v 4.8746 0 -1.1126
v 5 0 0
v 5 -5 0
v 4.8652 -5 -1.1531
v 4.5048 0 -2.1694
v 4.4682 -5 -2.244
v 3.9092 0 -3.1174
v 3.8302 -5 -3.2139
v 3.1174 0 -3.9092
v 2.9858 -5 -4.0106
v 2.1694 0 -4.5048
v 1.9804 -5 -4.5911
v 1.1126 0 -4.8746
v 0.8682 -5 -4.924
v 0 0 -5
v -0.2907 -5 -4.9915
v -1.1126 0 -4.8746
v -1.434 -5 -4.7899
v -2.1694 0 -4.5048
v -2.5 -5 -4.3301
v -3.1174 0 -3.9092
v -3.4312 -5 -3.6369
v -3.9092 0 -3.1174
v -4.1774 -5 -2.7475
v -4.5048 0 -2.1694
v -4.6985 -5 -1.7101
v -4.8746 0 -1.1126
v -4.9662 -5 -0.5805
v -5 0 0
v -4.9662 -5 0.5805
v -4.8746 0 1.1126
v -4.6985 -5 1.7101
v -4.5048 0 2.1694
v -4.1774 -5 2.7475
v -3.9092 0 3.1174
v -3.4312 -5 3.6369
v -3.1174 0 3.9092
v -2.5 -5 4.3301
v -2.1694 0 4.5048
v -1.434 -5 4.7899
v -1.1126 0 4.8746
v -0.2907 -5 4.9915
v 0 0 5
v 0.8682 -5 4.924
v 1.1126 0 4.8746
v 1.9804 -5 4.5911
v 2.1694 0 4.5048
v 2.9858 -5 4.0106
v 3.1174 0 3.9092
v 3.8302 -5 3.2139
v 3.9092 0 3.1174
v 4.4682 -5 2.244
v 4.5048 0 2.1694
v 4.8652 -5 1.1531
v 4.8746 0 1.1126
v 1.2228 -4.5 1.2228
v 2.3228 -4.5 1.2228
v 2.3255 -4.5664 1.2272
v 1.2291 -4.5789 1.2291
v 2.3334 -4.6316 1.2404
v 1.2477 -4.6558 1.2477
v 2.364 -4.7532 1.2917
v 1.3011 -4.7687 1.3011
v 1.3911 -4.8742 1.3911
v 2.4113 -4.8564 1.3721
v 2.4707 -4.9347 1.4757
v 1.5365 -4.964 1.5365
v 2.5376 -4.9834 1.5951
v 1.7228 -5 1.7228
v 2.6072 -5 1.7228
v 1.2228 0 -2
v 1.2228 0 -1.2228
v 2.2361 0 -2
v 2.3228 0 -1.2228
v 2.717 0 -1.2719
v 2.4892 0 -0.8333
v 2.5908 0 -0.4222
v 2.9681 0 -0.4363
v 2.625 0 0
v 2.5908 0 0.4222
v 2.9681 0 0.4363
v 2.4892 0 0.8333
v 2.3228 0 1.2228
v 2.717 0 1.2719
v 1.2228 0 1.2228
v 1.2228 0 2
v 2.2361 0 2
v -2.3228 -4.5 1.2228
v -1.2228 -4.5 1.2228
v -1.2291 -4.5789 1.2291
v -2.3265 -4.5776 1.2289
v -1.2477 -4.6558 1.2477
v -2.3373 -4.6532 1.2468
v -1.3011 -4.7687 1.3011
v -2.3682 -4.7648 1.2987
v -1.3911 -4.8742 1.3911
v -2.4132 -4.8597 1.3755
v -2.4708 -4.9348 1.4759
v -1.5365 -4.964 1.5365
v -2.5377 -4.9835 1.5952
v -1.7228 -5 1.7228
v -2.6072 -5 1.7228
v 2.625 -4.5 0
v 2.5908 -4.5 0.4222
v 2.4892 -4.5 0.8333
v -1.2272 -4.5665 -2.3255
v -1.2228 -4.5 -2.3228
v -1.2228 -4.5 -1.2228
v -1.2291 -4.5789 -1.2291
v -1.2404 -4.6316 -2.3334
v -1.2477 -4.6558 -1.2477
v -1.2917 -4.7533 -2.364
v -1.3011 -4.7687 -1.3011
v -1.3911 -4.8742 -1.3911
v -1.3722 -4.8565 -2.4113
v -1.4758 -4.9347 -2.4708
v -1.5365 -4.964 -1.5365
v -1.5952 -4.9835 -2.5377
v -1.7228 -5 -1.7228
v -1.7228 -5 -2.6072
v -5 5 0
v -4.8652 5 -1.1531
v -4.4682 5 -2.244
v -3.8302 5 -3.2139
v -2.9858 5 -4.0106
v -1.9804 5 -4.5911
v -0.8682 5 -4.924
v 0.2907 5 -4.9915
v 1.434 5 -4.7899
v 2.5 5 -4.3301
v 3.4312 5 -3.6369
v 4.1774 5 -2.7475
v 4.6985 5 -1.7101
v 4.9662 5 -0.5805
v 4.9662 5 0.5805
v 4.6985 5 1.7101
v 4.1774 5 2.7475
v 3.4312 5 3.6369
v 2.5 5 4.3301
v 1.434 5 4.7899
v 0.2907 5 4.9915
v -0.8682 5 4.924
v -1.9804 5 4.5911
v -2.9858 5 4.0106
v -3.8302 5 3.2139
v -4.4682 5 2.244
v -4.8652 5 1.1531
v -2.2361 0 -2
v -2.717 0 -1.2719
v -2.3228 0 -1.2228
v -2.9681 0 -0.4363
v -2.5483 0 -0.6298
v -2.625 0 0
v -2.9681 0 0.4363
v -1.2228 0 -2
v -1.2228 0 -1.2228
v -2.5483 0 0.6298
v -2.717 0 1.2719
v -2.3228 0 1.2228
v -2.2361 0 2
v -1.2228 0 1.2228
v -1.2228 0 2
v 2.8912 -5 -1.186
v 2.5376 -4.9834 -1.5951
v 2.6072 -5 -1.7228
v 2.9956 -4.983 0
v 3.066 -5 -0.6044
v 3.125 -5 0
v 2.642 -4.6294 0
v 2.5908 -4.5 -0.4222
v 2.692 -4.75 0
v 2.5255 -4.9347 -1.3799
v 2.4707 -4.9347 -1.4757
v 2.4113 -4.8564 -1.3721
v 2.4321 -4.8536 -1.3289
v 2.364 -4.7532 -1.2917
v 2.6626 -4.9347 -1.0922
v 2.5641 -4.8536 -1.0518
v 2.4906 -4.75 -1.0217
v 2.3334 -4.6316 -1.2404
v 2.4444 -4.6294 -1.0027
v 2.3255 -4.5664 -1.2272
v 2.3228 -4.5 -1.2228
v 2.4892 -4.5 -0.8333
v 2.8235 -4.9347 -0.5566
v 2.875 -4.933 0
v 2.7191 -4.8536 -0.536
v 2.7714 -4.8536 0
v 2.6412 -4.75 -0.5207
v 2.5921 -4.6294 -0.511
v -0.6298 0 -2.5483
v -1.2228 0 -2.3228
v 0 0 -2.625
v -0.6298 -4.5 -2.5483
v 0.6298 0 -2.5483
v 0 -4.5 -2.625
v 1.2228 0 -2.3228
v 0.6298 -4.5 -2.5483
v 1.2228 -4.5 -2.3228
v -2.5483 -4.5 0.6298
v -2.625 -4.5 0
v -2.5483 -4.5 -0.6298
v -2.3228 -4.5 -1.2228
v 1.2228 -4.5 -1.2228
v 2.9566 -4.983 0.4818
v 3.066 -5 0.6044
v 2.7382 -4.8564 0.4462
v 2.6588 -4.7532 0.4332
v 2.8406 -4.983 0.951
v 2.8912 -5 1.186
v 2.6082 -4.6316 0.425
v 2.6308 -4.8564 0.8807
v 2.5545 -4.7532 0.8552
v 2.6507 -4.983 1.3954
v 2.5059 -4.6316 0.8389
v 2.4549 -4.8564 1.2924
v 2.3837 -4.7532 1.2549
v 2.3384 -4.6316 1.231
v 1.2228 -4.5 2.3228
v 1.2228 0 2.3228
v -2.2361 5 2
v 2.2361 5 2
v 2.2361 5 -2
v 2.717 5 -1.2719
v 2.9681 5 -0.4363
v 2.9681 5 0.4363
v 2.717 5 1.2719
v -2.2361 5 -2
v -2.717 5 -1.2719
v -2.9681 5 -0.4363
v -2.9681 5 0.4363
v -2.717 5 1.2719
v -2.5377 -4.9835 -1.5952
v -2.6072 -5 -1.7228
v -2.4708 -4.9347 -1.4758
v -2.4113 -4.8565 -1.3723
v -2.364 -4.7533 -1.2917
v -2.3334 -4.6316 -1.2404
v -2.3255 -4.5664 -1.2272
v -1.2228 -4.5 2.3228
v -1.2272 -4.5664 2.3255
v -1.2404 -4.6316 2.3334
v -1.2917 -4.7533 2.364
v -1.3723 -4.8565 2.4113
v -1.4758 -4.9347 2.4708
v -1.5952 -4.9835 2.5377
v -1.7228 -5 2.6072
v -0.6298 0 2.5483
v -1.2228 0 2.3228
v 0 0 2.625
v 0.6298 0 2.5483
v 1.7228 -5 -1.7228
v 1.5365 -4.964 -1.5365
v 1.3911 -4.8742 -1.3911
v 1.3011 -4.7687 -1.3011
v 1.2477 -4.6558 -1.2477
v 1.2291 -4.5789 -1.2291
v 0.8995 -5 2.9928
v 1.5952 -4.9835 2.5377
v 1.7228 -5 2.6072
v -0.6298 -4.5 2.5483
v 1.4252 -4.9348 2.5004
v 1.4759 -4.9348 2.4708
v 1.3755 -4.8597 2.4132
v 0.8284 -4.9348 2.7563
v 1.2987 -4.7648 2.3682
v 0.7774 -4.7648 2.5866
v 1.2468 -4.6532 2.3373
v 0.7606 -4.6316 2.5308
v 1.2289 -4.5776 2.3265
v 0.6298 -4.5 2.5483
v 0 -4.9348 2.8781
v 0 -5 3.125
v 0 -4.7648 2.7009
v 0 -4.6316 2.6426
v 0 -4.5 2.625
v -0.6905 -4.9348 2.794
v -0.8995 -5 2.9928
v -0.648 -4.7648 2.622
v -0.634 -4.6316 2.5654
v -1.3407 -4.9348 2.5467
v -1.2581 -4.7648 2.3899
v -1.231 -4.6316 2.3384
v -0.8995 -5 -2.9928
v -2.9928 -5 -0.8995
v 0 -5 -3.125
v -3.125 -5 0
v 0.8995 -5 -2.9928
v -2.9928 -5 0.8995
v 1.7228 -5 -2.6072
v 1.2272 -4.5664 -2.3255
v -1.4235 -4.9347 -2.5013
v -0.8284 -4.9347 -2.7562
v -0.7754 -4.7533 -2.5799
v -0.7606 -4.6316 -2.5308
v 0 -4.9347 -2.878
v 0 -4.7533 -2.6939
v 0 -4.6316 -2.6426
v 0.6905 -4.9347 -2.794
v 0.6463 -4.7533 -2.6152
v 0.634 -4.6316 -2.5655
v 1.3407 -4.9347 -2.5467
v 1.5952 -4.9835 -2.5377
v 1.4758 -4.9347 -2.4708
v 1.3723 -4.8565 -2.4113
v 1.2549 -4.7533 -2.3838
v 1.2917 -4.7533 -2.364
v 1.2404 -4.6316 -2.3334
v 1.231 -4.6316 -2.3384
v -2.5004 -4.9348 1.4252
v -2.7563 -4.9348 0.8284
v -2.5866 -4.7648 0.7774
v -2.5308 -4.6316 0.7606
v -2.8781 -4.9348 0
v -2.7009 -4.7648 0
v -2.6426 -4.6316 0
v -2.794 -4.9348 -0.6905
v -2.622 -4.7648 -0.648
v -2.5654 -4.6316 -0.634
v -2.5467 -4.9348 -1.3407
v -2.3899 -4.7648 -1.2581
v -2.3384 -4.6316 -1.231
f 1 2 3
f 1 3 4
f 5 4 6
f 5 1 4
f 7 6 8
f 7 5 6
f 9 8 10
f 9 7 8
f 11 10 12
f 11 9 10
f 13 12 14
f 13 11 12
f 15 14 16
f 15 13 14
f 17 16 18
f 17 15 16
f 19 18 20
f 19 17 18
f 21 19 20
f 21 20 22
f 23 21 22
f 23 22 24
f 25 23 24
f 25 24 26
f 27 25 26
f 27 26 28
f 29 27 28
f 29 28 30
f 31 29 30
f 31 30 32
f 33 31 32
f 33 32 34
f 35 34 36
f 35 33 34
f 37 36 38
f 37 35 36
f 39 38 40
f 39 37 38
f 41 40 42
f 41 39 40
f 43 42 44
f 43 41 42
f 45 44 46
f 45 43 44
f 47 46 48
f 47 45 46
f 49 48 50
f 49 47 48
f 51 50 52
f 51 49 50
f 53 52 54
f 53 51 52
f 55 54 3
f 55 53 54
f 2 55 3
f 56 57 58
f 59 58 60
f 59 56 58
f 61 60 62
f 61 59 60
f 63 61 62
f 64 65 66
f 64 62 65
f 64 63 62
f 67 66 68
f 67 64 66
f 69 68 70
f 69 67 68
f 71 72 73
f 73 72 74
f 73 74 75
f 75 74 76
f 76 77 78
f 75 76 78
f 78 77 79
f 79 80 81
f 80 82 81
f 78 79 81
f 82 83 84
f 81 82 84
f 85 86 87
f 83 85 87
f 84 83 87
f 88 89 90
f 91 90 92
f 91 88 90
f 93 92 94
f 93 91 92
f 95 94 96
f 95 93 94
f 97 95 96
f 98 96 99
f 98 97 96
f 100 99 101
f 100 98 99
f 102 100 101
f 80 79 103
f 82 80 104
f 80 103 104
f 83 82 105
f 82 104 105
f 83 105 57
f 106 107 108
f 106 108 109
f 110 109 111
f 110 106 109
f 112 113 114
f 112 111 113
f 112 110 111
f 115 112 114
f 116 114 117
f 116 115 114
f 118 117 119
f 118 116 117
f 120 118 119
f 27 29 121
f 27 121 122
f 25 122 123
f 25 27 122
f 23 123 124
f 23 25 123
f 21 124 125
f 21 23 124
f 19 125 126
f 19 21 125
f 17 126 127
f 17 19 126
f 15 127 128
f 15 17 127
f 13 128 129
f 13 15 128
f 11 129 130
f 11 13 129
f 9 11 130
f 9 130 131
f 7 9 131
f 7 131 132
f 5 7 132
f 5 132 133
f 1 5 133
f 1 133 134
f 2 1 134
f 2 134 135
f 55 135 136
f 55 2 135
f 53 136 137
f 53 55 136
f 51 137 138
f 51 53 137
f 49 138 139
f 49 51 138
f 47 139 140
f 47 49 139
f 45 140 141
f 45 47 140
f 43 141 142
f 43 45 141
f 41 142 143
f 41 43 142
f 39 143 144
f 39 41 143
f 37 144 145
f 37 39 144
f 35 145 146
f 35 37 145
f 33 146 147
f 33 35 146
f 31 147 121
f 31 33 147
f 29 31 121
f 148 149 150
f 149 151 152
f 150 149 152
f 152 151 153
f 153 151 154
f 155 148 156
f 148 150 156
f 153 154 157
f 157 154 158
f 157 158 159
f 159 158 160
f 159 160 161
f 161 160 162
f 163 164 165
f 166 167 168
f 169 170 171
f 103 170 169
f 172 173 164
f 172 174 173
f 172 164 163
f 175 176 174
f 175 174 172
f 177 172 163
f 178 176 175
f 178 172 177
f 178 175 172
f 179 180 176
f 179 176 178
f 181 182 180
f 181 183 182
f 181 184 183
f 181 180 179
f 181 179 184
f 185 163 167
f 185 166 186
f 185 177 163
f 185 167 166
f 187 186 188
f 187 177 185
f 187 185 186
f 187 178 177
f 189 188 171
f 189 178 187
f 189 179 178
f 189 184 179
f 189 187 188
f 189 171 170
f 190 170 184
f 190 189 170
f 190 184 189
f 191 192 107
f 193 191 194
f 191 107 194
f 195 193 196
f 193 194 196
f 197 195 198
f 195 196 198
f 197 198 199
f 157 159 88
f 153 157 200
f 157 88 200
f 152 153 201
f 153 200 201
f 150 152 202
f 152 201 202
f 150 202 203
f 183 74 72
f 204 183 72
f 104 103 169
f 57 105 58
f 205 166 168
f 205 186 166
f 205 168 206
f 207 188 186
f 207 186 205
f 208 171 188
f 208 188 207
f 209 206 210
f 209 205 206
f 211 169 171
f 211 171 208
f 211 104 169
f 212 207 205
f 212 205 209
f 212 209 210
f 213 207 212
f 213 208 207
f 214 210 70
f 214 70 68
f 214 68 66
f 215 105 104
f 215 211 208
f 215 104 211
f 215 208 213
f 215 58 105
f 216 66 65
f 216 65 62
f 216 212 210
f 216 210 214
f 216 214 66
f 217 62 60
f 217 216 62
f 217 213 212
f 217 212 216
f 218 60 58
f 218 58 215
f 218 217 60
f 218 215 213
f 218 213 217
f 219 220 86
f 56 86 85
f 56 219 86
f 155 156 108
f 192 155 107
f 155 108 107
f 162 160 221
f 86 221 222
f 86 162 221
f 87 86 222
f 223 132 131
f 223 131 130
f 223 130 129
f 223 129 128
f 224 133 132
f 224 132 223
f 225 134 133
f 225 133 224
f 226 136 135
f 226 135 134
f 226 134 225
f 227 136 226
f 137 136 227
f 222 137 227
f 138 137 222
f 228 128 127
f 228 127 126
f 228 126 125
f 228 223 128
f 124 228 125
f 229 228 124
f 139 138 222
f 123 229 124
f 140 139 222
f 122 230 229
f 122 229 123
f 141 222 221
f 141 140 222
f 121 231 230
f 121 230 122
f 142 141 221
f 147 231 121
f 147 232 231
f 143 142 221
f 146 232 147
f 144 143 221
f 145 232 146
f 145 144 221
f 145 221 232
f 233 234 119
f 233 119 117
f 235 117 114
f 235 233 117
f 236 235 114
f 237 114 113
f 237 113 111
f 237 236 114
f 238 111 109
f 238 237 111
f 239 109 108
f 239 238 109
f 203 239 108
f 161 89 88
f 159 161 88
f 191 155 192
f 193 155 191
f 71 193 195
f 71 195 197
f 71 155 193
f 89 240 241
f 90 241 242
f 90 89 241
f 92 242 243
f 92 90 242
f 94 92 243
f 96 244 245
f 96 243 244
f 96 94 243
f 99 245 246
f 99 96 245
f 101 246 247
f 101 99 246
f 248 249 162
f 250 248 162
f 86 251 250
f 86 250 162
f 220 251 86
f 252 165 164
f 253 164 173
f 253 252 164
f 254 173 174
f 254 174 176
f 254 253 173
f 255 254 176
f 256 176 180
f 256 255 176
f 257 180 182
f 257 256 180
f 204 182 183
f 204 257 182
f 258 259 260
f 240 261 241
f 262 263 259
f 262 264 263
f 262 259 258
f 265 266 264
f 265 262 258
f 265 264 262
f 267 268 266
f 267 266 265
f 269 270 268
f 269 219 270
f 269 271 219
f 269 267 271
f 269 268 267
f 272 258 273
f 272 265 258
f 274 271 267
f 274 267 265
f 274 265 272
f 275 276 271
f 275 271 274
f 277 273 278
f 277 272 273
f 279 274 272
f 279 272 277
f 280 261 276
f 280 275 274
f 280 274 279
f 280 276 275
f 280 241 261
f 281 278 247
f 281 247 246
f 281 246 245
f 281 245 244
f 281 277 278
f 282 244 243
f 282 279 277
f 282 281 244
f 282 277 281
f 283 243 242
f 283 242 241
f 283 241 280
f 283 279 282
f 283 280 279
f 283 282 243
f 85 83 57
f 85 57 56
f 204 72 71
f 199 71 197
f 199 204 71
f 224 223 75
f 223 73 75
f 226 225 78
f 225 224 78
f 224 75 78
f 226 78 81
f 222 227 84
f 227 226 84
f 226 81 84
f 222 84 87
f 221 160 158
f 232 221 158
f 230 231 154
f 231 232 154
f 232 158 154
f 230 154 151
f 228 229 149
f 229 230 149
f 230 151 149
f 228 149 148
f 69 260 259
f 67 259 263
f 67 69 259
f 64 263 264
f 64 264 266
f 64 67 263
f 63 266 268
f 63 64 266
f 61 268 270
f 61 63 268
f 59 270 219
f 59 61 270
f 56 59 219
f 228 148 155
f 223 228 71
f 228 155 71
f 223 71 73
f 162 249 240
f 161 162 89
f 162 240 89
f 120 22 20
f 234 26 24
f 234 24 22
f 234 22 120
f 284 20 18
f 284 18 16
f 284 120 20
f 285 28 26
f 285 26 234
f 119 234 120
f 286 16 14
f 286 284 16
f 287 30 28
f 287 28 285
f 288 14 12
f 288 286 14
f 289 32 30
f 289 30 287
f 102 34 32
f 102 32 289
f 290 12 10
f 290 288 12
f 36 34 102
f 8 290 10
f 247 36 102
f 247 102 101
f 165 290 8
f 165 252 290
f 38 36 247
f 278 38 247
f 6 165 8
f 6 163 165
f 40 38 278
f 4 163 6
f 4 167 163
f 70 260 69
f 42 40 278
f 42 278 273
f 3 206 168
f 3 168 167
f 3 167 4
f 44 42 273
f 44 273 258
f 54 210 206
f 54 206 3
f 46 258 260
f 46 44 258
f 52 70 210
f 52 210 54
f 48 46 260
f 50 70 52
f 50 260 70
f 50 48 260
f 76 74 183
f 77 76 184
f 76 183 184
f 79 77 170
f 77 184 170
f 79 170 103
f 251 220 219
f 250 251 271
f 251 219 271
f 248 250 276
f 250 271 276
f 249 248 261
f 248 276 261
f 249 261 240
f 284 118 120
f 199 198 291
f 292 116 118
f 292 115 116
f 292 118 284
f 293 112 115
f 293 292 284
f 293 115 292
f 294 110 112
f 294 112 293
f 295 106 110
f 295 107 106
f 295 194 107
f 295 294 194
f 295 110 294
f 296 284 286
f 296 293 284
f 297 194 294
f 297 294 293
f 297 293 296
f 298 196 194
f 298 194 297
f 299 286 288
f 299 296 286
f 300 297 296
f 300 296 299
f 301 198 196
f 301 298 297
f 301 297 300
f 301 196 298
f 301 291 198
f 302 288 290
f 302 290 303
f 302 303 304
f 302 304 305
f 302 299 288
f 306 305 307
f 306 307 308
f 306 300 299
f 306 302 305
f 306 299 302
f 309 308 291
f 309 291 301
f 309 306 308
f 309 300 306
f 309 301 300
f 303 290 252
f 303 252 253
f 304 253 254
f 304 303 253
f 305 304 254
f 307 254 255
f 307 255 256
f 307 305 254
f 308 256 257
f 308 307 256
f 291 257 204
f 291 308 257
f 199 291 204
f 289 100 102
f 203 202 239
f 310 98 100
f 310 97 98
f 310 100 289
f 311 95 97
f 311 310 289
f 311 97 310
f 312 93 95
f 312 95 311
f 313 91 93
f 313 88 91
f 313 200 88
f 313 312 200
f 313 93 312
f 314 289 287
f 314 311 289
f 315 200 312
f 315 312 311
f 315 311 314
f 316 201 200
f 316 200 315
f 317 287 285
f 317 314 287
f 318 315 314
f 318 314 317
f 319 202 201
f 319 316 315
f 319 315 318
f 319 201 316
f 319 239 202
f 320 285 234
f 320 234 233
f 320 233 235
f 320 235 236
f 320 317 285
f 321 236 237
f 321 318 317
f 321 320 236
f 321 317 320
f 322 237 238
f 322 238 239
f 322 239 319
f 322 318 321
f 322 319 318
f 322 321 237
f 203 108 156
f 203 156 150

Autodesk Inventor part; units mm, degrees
ref_plane "YZ Plane" through (0, 0, 0) normal (1, 0, 0) x (0, 1, 0)
ref_plane "XZ Plane" through (0, 0, 0) normal (0, 1, 0) x (-1, 0, 0)
ref_plane "XY Plane" through (0, 0, 0) normal (0, 0, 1) x (1, 0, 0)
sketch "Sketch1" plane through (0, 0, 0) normal (0, 1, 0) x (-1, 0, 0)
  line L0 (2.2361, -2) -> (-2.2361, -2)
  line L1 (2.2361, 2) -> (-2.2361, 2)
  arc A0 (2.2361, -2) -> (2.2361, 2) centre (0, 0) ccw
  arc A1 (-2.2361, 2) -> (-2.2361, -2) centre (0, 0) ccw
  circle A2 centre (0, 0) radius 5
  dimension "d1" = 2
  dimension "d2" = 2
  dimension "d3" = 10
  dimension "d20" = 3
  dimension "d21" = 3
extrude "Extrusion1" add sketch "Sketch1" along normal blind 5
sketch "Sketch2" plane through (0, 0, 0) normal (0, -1, 0) x (1, 0, 0)
  circle A0 centre (0, 0) radius 5
  dimension "d19" = 10
extrude "Extrusion2" add sketch "Sketch2" along normal blind 5
sketch "Sketch3" plane through (0, -5, 0) normal (0, -1, 0) x (1, 0, 0)
  circle A0 centre (0, 0) radius 2.625
  line L0 (1.2228, 2.3228) -> (1.2228, 1.2228)
  line L1 (1.2228, -1.2228) -> (1.2228, -2.3228)
  line L2 (2.3228, -1.2228) -> (1.2228, -1.2228)
  line L3 (-1.2228, -1.2228) -> (-2.3228, -1.2228)
  line L4 (2.3228, 1.2228) -> (1.2228, 1.2228)
  line L5 (-1.2228, 1.2228) -> (-2.3228, 1.2228)
  line L6 (-1.2228, 2.3228) -> (-1.2228, 1.2228)
  line L7 (-1.2228, -1.2228) -> (-1.2228, -2.3228)
  dimension "d10" = 5.25
  dimension "d22" = 1.1
  dimension "d23" = 1.1
  dimension "d24" = 1.1
  dimension "d25" = 1.1
  dimension "d26" = 1.1
  dimension "d27" = 1.1
  dimension "d28" = 1.1
  dimension "d29" = 1.1
extrude "Extrusion3" cut sketch "Sketch3" against normal blind 5 contours A0 L2 L1 L7 L3 L5 L6 L0 L4
fillet "Fillet2" radius 0.5 12 edges at (2.625, -5, 0) (1.7728, -5, 1.2228) (1.2228, -5, 1.7728) (0, -5, 2.625) (-1.2228, -5, 1.7728) (-2.625, -5, 0) (-1.7728, -5, 1.2228) (-1.7728, -5, -1.2228) (-1.2228, -5, -1.7728) (0, -5, -2.625) (1.7728, -5, -1.2228) (1.2228, -5, -1.7728)
equation "\"d23\" = d22"
equation "\"d24\" = d22"
equation "\"d25\" = d22"
equation "\"d26\" = d22"
equation "\"d27\" = d22"
equation "\"d28\" = d22"
equation "\"d29\" = d22"
properties part number "dif-coupler"
